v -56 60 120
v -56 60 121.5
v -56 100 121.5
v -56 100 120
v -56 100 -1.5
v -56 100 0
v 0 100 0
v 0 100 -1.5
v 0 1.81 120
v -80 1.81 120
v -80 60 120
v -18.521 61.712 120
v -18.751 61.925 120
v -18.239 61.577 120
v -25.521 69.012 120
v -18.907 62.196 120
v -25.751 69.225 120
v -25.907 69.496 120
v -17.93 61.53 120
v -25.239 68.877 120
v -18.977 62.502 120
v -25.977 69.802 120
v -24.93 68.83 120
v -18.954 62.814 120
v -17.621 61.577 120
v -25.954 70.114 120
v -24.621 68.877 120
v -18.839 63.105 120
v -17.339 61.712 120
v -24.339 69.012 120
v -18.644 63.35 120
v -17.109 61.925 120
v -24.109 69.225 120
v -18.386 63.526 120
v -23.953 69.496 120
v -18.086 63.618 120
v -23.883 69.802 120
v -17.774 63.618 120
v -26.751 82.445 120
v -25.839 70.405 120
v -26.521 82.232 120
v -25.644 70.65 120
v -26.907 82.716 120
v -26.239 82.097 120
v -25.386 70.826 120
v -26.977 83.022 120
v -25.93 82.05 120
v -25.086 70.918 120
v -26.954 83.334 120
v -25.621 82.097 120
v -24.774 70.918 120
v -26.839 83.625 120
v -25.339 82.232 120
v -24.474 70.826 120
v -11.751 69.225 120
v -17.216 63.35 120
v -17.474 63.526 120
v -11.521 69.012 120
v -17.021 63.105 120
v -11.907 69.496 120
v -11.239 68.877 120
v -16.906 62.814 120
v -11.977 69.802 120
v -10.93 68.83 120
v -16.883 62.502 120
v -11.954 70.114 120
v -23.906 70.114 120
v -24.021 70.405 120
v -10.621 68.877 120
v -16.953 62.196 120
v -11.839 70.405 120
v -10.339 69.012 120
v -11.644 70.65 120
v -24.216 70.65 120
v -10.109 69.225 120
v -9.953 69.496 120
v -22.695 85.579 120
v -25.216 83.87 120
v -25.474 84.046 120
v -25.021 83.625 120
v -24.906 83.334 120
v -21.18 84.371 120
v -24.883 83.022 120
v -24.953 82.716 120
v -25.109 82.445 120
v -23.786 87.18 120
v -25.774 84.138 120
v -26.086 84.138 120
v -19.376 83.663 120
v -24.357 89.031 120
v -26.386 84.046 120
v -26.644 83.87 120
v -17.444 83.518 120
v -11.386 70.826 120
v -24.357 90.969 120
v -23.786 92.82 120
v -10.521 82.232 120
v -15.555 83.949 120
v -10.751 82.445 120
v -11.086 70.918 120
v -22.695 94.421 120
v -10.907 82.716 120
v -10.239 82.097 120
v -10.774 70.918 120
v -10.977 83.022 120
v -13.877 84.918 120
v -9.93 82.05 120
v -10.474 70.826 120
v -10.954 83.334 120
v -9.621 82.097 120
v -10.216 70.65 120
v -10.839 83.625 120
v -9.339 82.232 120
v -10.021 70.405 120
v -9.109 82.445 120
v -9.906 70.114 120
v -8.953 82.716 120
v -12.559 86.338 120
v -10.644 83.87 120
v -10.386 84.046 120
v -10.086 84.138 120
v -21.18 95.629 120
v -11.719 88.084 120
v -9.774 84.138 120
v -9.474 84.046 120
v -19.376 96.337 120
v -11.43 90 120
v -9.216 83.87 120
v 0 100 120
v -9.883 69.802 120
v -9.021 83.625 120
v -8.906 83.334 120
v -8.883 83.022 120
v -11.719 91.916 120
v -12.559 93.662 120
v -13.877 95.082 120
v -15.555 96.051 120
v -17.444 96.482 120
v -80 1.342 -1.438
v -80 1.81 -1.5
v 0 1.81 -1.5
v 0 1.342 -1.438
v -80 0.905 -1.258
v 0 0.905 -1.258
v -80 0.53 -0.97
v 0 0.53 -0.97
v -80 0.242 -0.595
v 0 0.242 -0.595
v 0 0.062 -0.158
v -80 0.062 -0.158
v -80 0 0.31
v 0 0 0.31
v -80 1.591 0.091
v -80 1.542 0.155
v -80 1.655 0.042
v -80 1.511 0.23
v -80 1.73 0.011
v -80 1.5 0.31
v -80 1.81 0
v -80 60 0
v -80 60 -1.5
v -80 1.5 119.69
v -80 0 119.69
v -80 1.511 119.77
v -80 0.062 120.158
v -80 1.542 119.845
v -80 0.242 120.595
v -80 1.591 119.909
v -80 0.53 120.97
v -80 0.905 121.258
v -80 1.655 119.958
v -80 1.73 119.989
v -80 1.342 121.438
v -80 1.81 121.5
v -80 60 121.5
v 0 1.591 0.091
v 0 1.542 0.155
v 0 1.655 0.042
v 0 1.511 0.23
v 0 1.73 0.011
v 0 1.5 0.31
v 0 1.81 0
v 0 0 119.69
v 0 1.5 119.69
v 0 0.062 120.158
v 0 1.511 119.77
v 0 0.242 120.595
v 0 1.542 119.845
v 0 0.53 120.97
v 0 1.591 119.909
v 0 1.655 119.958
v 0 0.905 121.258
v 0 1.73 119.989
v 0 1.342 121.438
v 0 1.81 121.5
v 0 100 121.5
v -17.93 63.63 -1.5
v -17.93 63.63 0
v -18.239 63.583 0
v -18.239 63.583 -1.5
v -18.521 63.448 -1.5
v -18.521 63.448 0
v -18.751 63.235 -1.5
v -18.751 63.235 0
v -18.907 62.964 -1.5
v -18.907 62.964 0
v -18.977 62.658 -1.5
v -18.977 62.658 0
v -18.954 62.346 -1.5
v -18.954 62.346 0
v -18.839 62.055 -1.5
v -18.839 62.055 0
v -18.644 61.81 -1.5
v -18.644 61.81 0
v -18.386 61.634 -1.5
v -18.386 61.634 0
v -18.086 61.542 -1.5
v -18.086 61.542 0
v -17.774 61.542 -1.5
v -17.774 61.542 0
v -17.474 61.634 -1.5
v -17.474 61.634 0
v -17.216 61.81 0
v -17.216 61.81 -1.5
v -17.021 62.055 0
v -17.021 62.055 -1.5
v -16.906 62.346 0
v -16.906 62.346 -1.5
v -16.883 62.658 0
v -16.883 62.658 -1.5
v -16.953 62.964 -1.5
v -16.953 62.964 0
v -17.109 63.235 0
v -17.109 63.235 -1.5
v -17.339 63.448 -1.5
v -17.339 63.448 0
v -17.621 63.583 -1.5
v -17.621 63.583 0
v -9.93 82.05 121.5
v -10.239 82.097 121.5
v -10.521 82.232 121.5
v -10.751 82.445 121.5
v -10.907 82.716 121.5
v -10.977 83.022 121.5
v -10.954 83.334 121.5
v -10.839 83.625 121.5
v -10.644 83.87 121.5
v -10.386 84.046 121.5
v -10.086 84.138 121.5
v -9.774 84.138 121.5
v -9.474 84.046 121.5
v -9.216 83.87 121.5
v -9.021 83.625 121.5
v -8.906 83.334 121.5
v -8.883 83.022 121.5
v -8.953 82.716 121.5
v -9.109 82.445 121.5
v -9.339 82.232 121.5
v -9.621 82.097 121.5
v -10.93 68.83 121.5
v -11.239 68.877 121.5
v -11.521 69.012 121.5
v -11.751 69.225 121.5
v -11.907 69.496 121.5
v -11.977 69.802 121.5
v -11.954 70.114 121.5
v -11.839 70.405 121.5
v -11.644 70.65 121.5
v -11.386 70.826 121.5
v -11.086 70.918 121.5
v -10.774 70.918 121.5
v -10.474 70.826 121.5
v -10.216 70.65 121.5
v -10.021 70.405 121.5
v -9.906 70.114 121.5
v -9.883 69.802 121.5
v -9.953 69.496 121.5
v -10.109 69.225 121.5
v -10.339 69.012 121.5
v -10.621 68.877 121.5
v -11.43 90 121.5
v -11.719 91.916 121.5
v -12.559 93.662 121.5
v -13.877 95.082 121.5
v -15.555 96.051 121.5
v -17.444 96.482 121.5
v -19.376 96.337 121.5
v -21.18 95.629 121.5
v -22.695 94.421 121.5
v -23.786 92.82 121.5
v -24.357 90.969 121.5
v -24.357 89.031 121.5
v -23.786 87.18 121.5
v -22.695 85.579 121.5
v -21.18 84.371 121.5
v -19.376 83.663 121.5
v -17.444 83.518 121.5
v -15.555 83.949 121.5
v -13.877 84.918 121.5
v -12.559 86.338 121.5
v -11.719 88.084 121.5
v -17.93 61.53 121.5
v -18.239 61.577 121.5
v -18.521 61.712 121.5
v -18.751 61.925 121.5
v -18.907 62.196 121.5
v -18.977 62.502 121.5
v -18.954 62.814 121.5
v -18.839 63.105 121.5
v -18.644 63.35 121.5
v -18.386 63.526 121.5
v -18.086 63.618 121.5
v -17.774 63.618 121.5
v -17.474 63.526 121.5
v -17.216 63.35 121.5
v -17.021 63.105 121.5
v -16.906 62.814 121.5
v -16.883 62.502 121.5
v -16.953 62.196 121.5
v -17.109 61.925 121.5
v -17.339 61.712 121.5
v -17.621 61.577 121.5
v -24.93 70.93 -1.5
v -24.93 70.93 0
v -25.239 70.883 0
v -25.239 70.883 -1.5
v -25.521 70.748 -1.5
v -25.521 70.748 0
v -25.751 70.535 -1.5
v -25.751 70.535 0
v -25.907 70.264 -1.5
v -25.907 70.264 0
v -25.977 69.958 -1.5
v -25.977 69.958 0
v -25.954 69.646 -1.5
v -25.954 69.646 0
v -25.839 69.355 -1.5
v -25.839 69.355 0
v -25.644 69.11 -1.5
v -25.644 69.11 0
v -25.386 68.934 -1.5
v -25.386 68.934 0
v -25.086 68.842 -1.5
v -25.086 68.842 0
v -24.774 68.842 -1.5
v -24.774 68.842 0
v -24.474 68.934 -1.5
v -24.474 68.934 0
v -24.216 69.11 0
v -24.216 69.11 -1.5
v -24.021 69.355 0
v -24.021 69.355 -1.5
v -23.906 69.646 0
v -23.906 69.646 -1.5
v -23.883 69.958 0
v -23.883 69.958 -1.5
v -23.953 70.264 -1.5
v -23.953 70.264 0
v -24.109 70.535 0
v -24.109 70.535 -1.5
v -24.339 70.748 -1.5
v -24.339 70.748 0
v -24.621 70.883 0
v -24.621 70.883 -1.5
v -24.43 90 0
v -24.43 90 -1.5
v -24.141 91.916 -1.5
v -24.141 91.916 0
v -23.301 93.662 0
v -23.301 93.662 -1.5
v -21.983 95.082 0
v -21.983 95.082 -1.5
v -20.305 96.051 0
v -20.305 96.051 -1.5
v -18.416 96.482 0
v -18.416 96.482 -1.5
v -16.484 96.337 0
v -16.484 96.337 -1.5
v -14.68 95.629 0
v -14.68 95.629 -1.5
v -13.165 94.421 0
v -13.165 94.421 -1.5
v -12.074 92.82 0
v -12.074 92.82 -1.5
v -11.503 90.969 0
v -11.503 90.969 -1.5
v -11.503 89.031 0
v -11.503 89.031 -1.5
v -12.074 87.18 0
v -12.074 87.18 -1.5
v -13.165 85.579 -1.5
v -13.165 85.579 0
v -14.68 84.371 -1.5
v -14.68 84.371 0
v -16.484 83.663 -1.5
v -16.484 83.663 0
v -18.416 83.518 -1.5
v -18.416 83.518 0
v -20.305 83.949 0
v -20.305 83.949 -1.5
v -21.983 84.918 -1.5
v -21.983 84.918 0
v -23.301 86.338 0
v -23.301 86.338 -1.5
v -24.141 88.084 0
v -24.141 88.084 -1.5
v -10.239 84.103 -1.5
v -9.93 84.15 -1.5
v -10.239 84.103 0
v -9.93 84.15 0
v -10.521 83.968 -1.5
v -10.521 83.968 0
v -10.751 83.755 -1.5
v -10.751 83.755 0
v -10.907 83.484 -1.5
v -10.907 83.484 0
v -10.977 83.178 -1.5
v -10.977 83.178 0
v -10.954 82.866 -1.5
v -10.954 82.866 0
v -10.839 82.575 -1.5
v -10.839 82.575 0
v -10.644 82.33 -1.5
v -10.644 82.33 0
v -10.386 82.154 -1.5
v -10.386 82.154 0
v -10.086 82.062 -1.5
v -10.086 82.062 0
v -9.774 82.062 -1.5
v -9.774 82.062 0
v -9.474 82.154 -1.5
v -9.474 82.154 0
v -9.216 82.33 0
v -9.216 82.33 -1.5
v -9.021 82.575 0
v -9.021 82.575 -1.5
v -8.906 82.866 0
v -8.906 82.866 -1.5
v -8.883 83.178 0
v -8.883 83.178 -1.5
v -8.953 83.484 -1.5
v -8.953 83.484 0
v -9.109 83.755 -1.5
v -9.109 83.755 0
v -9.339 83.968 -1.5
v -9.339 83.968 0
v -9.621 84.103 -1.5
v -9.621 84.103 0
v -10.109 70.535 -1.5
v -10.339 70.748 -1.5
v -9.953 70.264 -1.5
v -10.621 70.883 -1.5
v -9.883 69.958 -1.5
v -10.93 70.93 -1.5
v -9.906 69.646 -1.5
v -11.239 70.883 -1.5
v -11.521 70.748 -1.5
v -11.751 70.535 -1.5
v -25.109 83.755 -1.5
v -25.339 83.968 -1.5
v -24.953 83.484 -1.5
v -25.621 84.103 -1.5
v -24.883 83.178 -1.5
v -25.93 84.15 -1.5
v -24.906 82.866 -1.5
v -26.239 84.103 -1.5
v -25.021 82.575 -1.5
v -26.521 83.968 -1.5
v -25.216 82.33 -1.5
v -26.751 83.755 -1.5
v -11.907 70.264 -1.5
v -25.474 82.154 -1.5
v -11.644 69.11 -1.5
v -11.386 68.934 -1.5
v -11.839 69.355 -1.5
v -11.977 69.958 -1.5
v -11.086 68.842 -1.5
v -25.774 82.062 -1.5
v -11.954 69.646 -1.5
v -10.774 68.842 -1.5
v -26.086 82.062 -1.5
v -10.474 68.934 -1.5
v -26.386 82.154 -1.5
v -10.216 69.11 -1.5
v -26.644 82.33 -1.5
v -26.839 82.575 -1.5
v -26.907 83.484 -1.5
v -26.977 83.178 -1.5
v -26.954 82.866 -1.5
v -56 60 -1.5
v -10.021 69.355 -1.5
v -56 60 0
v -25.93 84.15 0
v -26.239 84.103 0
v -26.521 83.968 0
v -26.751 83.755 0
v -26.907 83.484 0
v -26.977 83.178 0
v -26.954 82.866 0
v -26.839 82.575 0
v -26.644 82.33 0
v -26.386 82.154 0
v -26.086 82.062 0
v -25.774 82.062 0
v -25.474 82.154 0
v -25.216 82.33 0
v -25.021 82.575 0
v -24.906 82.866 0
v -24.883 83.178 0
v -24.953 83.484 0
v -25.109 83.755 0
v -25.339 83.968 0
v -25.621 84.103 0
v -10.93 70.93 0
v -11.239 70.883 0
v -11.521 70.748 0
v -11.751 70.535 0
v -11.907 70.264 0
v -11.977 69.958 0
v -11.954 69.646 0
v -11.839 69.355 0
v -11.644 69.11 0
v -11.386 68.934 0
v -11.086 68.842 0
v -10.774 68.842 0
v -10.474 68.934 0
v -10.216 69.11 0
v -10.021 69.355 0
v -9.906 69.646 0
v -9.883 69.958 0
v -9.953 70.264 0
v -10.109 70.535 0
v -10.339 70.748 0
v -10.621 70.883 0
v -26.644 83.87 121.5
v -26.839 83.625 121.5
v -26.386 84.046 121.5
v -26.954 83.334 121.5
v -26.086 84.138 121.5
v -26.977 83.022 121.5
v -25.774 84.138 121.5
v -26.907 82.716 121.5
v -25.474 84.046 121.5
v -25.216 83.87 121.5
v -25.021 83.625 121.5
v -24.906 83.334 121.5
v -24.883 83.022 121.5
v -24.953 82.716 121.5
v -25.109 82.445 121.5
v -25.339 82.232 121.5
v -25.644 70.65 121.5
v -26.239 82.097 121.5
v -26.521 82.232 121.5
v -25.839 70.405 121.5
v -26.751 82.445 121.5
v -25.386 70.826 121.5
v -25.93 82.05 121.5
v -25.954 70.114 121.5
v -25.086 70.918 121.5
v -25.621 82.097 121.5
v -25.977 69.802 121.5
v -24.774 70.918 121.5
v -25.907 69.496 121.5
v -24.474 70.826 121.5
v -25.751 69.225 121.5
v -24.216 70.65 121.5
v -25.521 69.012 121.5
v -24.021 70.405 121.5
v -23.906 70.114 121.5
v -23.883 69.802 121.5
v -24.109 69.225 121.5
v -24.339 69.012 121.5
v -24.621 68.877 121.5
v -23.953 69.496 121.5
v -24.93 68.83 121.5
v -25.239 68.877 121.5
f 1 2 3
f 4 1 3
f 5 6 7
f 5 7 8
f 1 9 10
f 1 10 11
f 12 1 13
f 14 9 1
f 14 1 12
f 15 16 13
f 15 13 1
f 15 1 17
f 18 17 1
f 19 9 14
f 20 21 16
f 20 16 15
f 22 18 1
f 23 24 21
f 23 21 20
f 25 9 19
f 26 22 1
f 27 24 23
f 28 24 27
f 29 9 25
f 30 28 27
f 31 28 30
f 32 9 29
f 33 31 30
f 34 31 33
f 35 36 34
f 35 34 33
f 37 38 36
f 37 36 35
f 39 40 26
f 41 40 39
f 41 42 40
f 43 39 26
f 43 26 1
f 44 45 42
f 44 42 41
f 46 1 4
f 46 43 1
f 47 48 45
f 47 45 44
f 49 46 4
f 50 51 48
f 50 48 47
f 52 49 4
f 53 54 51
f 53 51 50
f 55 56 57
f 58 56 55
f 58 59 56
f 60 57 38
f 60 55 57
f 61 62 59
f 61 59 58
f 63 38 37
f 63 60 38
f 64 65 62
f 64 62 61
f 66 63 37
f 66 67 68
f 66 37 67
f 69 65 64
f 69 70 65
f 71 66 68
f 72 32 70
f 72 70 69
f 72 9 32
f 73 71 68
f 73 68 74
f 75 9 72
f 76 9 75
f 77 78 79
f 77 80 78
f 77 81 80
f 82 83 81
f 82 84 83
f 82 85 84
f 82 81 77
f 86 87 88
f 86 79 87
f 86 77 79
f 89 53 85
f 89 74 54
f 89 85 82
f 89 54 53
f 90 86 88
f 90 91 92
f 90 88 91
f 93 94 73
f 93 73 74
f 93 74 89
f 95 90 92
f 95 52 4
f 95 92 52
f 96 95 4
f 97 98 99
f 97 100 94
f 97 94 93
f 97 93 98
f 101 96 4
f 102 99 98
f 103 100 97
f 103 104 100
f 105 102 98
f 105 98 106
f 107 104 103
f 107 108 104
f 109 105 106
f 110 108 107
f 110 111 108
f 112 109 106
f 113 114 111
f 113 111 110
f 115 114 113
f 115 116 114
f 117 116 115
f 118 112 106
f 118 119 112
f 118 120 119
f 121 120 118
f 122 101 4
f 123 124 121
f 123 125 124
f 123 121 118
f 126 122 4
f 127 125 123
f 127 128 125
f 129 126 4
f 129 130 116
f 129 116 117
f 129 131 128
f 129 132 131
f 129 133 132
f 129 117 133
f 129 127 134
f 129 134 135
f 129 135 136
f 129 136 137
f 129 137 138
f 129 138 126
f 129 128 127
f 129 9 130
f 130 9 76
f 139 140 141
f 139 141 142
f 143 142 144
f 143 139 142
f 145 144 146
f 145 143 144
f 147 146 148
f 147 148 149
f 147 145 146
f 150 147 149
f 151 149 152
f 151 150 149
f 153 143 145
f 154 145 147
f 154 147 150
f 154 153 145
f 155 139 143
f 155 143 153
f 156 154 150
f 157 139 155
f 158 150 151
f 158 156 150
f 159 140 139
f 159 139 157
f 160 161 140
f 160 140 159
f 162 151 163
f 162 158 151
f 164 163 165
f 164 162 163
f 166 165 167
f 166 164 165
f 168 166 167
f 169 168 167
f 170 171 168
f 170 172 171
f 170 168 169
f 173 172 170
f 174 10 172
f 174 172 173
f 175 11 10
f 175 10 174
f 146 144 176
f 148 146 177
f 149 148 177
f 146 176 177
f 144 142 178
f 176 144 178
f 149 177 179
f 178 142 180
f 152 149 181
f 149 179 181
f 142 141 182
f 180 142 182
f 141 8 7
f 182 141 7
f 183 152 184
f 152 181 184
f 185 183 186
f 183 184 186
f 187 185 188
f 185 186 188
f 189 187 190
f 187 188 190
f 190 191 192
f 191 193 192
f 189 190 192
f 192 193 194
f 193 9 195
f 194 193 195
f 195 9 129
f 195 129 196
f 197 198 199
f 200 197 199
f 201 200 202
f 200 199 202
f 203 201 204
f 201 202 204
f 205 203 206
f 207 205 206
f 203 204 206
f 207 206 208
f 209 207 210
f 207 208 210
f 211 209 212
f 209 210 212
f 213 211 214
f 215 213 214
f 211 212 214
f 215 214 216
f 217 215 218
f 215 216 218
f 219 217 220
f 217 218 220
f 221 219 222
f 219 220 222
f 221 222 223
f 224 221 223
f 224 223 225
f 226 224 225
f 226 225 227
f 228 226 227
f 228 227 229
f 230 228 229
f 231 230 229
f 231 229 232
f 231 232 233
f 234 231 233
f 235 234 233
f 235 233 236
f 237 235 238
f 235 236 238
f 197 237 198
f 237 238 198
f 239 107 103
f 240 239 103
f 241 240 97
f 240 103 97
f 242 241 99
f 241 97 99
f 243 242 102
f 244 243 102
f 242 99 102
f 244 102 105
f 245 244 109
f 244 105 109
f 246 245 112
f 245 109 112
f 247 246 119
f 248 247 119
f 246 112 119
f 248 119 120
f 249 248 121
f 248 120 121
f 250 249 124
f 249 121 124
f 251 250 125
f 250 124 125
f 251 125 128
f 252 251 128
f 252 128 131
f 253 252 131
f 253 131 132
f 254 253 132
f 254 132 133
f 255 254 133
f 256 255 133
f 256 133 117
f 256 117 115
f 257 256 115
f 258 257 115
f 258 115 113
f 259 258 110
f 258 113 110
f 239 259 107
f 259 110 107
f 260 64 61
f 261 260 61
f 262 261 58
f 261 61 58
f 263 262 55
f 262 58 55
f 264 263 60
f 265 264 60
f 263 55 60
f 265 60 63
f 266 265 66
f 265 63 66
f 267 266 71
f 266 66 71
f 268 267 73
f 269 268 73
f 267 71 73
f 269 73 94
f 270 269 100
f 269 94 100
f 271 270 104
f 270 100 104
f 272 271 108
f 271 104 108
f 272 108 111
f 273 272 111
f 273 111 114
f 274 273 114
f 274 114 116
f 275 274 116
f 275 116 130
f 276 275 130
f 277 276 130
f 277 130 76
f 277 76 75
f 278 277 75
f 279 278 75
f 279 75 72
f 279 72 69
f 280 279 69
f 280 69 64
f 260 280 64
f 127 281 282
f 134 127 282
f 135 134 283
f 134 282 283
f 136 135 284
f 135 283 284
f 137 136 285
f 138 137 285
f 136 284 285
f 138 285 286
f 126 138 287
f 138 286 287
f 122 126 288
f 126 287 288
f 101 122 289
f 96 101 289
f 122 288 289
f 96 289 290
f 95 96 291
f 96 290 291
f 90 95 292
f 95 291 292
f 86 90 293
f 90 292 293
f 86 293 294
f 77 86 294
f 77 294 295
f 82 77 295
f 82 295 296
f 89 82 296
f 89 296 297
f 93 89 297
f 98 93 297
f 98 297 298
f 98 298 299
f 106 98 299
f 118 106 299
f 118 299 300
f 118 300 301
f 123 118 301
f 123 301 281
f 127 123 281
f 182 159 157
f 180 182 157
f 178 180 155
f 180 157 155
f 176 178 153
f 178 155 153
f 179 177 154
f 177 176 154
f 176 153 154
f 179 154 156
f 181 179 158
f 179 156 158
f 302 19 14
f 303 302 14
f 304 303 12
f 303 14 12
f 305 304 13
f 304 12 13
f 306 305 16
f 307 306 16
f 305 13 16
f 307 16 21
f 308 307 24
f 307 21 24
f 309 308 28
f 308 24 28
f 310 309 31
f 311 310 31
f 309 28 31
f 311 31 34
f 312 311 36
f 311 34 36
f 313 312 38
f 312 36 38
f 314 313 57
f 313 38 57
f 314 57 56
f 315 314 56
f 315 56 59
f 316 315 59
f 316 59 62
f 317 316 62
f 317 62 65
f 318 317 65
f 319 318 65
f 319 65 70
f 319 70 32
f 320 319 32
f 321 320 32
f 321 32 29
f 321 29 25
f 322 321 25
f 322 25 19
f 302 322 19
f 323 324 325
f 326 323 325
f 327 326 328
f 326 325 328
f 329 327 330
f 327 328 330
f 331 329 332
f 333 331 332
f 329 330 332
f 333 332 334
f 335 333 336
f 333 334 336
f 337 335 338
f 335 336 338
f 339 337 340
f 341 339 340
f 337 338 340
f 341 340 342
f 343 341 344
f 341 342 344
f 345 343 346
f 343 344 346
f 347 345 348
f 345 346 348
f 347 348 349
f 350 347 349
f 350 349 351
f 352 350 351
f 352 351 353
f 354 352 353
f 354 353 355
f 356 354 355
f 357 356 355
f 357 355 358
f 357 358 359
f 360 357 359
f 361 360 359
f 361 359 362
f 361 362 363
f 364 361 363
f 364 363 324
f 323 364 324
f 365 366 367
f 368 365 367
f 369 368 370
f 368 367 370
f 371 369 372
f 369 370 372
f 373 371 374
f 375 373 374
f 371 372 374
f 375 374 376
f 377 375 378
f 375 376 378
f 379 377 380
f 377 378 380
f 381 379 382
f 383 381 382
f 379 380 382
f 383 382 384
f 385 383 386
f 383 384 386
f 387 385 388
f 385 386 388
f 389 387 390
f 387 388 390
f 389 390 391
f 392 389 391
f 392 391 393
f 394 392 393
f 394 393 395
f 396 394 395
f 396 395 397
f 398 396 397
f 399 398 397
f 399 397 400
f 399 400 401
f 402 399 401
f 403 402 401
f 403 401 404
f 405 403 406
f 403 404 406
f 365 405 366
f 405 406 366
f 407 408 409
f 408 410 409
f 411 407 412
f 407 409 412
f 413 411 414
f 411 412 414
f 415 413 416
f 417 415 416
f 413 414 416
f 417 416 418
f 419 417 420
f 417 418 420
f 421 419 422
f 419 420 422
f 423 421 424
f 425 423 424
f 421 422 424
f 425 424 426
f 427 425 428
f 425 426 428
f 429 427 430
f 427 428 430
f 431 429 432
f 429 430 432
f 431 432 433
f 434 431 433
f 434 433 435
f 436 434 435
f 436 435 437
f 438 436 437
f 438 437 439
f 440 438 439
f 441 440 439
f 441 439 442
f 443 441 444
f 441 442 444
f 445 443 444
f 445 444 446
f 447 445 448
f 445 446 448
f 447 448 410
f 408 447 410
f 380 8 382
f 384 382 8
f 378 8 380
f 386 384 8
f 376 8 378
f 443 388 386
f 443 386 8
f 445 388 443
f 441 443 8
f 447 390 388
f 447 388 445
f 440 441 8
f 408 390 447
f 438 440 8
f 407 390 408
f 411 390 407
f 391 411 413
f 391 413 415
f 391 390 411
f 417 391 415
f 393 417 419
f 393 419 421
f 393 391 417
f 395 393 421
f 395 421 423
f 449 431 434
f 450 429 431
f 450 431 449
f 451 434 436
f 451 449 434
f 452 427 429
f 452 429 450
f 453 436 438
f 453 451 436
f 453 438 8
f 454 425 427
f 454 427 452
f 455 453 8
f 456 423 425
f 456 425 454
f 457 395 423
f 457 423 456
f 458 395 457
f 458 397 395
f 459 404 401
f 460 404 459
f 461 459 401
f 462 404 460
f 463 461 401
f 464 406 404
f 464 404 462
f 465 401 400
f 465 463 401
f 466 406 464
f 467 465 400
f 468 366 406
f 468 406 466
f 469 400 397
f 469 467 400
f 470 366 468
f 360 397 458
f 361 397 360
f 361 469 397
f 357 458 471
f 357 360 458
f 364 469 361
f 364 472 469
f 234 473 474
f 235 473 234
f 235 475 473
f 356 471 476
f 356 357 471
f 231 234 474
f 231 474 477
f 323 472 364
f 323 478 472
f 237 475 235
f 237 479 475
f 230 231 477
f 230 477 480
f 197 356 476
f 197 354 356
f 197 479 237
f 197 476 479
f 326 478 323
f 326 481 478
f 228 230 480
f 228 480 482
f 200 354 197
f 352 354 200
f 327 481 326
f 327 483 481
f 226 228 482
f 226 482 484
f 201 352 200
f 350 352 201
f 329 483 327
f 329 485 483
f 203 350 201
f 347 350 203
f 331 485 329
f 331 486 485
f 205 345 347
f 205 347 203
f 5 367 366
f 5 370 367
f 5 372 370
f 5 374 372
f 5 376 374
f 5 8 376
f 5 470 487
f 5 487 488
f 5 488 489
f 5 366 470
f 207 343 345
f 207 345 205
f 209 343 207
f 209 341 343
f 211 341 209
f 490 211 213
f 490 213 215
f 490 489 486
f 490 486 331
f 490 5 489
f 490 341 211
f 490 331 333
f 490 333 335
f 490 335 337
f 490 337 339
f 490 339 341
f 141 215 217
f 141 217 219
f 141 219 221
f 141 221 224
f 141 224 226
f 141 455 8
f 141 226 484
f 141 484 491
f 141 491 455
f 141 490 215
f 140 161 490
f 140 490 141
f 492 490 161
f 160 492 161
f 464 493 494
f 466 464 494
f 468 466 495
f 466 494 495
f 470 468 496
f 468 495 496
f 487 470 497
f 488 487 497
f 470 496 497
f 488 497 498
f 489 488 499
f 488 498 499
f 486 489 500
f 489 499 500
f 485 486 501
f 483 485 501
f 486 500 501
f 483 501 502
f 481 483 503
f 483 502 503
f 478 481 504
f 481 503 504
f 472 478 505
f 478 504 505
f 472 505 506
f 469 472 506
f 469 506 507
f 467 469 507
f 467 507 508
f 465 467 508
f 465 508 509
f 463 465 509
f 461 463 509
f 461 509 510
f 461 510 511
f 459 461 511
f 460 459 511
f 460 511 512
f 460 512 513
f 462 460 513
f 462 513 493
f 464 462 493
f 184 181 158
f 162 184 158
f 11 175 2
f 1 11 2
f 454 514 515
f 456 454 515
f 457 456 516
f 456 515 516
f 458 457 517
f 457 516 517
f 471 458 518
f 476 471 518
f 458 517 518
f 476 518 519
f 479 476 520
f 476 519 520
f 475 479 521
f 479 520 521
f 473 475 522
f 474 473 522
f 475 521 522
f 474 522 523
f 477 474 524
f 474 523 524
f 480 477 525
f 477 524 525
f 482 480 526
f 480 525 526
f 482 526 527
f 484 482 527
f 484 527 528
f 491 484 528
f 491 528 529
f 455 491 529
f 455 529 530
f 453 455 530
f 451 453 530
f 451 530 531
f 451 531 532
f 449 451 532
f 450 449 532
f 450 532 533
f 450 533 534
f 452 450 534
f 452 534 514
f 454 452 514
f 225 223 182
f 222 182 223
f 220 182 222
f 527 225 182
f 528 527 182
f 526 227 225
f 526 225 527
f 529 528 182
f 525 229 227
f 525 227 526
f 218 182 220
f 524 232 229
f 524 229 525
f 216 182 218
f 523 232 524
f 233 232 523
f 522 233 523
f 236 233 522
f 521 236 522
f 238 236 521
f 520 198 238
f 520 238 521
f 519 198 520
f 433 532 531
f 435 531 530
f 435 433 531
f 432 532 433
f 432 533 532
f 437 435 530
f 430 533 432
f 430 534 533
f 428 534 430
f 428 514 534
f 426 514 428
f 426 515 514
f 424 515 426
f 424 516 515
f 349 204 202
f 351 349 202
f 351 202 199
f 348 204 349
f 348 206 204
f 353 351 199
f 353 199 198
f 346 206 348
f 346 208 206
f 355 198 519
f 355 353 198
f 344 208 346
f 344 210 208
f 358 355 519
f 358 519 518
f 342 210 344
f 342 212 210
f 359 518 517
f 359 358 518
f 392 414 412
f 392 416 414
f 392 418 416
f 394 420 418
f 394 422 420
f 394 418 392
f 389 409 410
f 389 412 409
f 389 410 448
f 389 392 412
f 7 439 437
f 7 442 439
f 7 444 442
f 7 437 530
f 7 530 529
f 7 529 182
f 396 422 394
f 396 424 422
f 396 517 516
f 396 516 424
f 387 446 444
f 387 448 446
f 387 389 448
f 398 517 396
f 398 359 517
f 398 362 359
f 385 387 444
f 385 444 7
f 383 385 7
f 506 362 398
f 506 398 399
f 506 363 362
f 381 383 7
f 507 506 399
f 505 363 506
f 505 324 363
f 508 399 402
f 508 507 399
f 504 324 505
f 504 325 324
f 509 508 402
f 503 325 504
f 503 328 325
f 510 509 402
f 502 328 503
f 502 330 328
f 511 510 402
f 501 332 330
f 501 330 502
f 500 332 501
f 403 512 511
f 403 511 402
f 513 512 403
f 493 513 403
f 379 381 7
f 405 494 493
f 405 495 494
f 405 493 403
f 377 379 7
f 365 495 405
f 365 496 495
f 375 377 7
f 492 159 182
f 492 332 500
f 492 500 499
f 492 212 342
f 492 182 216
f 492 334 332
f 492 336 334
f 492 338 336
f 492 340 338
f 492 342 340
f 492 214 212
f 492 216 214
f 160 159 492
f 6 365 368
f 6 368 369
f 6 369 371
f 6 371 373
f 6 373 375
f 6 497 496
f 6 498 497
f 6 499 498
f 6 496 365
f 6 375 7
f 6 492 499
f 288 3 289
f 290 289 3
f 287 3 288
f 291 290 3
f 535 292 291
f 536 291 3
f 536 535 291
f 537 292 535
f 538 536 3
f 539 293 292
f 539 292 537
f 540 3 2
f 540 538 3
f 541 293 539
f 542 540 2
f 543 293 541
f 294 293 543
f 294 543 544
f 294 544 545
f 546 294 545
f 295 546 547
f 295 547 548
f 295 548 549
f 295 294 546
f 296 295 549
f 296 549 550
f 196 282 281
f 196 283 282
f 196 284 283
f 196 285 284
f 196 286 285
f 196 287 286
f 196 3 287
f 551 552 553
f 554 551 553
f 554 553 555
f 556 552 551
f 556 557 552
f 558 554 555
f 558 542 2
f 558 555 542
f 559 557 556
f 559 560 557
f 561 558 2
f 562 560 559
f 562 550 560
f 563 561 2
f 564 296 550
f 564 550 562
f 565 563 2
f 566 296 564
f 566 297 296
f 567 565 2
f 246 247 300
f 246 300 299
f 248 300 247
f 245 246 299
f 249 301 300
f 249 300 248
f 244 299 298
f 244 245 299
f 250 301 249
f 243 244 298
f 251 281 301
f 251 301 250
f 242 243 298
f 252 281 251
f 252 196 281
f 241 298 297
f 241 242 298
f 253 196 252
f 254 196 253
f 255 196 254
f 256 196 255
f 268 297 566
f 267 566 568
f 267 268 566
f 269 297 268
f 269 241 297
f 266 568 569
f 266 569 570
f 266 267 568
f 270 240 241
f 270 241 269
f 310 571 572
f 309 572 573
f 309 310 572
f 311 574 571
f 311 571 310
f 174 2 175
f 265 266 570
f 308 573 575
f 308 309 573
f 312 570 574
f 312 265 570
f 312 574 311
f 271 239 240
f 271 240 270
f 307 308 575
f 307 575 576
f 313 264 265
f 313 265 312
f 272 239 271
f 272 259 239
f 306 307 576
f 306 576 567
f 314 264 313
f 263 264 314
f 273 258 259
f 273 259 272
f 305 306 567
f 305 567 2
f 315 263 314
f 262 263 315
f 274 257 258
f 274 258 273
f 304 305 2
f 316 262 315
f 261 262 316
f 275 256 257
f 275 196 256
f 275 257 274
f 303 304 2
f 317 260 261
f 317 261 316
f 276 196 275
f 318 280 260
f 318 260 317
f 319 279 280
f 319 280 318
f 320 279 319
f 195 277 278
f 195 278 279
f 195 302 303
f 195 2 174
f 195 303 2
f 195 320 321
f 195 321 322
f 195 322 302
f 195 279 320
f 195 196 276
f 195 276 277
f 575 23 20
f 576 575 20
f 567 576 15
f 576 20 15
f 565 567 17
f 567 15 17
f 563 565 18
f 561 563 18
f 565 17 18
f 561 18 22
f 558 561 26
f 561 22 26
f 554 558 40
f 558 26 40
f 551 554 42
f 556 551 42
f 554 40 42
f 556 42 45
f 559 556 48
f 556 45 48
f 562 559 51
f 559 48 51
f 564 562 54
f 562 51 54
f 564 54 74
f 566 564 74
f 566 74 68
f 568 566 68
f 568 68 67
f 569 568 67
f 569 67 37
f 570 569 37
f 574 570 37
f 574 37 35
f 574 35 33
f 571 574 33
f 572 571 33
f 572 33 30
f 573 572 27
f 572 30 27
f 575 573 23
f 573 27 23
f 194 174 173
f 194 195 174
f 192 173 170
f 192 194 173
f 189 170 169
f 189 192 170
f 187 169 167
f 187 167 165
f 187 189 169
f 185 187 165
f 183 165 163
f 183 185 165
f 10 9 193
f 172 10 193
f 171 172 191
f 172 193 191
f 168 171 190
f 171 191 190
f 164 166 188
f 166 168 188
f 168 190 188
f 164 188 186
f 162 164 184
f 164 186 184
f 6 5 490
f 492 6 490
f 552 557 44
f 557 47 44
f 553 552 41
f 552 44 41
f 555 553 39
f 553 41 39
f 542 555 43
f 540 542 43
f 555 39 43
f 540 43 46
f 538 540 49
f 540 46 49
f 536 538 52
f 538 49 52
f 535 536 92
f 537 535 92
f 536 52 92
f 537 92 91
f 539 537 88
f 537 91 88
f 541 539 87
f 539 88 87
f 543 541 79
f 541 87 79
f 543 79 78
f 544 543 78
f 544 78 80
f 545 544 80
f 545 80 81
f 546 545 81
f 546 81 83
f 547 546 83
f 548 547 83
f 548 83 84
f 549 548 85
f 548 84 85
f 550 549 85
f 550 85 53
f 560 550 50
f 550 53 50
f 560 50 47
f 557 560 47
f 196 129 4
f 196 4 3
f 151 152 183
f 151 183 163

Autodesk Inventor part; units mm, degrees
ref_plane "YZ Plane" through (0, 0, 0) normal (1, 0, 0) x (0, 1, 0)
ref_plane "XZ Plane" through (0, 0, 0) normal (0, 1, 0) x (-1, 0, 0)
ref_plane "XY Plane" through (0, 0, 0) normal (0, 0, 1) x (1, 0, 0)
sketch "Sketch1" plane through (0, 0, 0) normal (0, 1, 0) x (-1, 0, 0)
  line L0 (0, 0) -> (80, 0)
  line L1 (80, 0) -> (80, 120)
  line L2 (80, 120) -> (0, 120)
  line L3 (0, 120) -> (0, 0)
  dimension "d0" = 80
  dimension "d1" = 120
extrude "Plate1" add sketch "Sketch1" along normal blind 1.5
sketch "Sketch2" plane through (0, 0, 121.5) normal (0, 0, -1) x (-1, 0, 0)
  line L0 (80, 0) -> (0, 0)
  line L1 (0, 0) -> (0, 100)
  line L2 (0, 100) -> (80, 100)
  line L3 (80, 100) -> (80, 0)
edge flange "Flange1" height 100 angle 90 thickness 1.5 bend radius 0.31 thickness toward (0, 0, -1) relief tear relief width 1.5 relief depth 0.75 edges at (-40, 1.5, 120) wall of the first edge with corners at (-80, 0, 121.5) (0, 0, 121.5) (0, 100, 121.5) (-80, 100, 121.5)
bend "Bend1"
corner "Corner1"
sketch "Sketch3" plane through (-80, 0, -1.5) normal (0, 0, 1) x (1, 0, 0)
  line L0 (80, 0) -> (0, 0)
  line L1 (0, 0) -> (0, 100)
  line L2 (0, 100) -> (80, 100)
  line L3 (80, 100) -> (80, 0)
edge flange "Flange2" height 100 angle 90 thickness 1.5 bend radius 0.31 thickness toward (0, 0, 1) relief tear relief width 1.5 relief depth 0.75 edges at (-40, 1.5, 0) wall of the first edge with corners at (0, 0, -1.5) (-80, 0, -1.5) (-80, 100, -1.5) (0, 100, -1.5)
bend "Bend2"
corner "Corner2"
sketch "Sketch4" plane through (0, 100, -1.5) normal (0, 0, -1) x (-1, 0, 0)
  line L0 (56, -40) -> (80, -40)
  line L1 (80, -40) -> (80, 0)
  line L2 (80, 0) -> (56, 0)
  line L3 (56, 0) -> (56, -40)
  line L4 (80, 0) -> (80, -98.19) projected
  line L5 (0, 0) -> (80, 0) projected
  point P0 (0, -100)
  dimension "d23" = 24
  dimension "d24" = 40
extrude "Cut1" cut sketch "Sketch4" against normal blind 1.5
sketch "Sketch5" plane through (0, 100, 120) normal (0, 0, -1) x (-1, 0, 0)
  point P0 (0, -100)
sketch "Sketch6" plane through (-80, 100, 121.5) normal (0, 0, 1) x (1, 0, 0)
  line L0 (24, 0) -> (0, 0)
  line L1 (0, 0) -> (0, -40)
  line L2 (0, -40) -> (24, -40)
  line L3 (24, -40) -> (24, 0)
  line L4 (0, -98.19) -> (0, 0) projected
  line L5 (0, 0) -> (80, 0) projected
  point P0 (80, -100)
  dimension "d27" = 40
  dimension "d28" = 24
extrude "Cut2" cut sketch "Sketch6" against normal blind 1.5
sketch "Sketch7" plane through (0, 1.81, -1.5) normal (0, 0, -1) x (-1, 0, 0)
  circle A0 centre (17.93, 60.77) radius 0.7835 projected
  circle A1 centre (10.93, 68.07) radius 0.7835 projected
  circle A2 centre (24.93, 68.07) radius 0.7835 projected
  circle A3 centre (9.93, 81.29) radius 0.7835 projected
  circle A4 centre (25.93, 81.29) radius 0.7835 projected
  line L0 (24, 59.37) -> (11.86, 59.37) projected
  line L1 (24, 59.37) -> (24, 60.09) projected
  arc A5 (26, 62.09) -> (24, 60.09) centre (26, 60.09) ccw projected
  line L2 (26, 62.09) -> (26.72, 62.09) projected
  line L3 (26.72, 94.19) -> (26.72, 62.09) projected
  line L4 (26.72, 94.19) -> (26, 94.19) projected
  arc A6 (24, 96.19) -> (26, 94.19) centre (26, 96.19) ccw projected
  line L5 (24, 96.19) -> (24, 96.91) projected
  line L6 (11.86, 96.91) -> (24, 96.91) projected
  line L7 (11.86, 96.91) -> (11.86, 96.19) projected
  arc A7 (9.86, 94.19) -> (11.86, 96.19) centre (9.86, 96.19) ccw projected
  line L8 (9.86, 94.19) -> (9.14, 94.19) projected
  line L9 (9.14, 62.09) -> (9.14, 94.19) projected
  line L10 (9.14, 62.09) -> (9.86, 62.09) projected
  arc A8 (11.86, 60.09) -> (9.86, 62.09) centre (9.86, 60.09) ccw projected
  line L11 (11.86, 60.09) -> (11.86, 59.37) projected
  circle A9 centre (17.93, 88.19) radius 6.4 projected
  point P0 (0, -1.81)
  point P1 (11.86, 94.19)
hole "Hole1" at (-10.93, 69.88, -1.5) at (-9.93, 83.1, -1.5) at (-25.93, 83.1, -1.5) at (-24.93, 69.88, -1.5) at (-17.93, 62.58, -1.5) direction (0, 0, 1) diameter 2.1 depth 1.5
sketch "Sketch8" plane through (-80, 1.81, 121.5) normal (0, 0, 1) x (1, 0, 0)
  circle A0 centre (62.07, 60.77) radius 0.7835 projected
  circle A1 centre (55.07, 68.07) radius 0.7835 projected
  circle A2 centre (69.07, 68.07) radius 0.7835 projected
  circle A3 centre (54.07, 81.29) radius 0.7835 projected
  circle A4 centre (70.07, 81.29) radius 0.7835 projected
  line L0 (68.14, 59.37) -> (56, 59.37) projected
  line L1 (68.14, 59.37) -> (68.14, 60.09) projected
  arc A5 (70.14, 62.09) -> (68.14, 60.09) centre (70.14, 60.09) ccw projected
  line L2 (70.14, 62.09) -> (70.86, 62.09) projected
  line L3 (70.86, 94.19) -> (70.86, 62.09) projected
  line L4 (70.86, 94.19) -> (70.14, 94.19) projected
  arc A6 (68.14, 96.19) -> (70.14, 94.19) centre (70.14, 96.19) ccw projected
  line L5 (68.14, 96.19) -> (68.14, 96.91) projected
  line L6 (56, 96.91) -> (68.14, 96.91) projected
  line L7 (56, 96.91) -> (56, 96.19) projected
  arc A7 (54, 94.19) -> (56, 96.19) centre (54, 96.19) ccw projected
  line L8 (54, 94.19) -> (53.28, 94.19) projected
  line L9 (53.28, 62.09) -> (53.28, 94.19) projected
  line L10 (53.28, 62.09) -> (54, 62.09) projected
  arc A8 (56, 60.09) -> (54, 62.09) centre (54, 60.09) ccw projected
  line L11 (56, 60.09) -> (56, 59.37) projected
  circle A9 centre (62.07, 88.19) radius 6.4 projected
  point P0 (80, -1.81)
  point P1 (56, 94.19)
hole "Hole2" at (-25.93, 83.1, 121.5) at (-9.93, 83.1, 121.5) at (-10.93, 69.88, 121.5) at (-24.93, 69.88, 121.5) at (-17.93, 62.58, 121.5) direction (0, 0, -1) diameter 2.1 depth 1.5
sketch "Sketch9" plane through (-80, 1.81, 121.5) normal (0, 0, 1) x (1, 0, 0)
  circle A0 centre (62.07, 60.77) radius 0.7835 projected
  circle A1 centre (55.07, 68.07) radius 0.7835 projected
  circle A2 centre (69.07, 68.07) radius 0.7835 projected
  circle A3 centre (54.07, 81.29) radius 0.7835 projected
  circle A4 centre (70.07, 81.29) radius 0.7835 projected
  line L0 (68.14, 59.37) -> (56, 59.37) projected
  line L1 (68.14, 59.37) -> (68.14, 60.09) projected
  arc A5 (70.14, 62.09) -> (68.14, 60.09) centre (70.14, 60.09) ccw projected
  line L2 (70.14, 62.09) -> (70.86, 62.09) projected
  line L3 (70.86, 94.19) -> (70.86, 62.09) projected
  line L4 (70.86, 94.19) -> (70.14, 94.19) projected
  arc A6 (68.14, 96.19) -> (70.14, 94.19) centre (70.14, 96.19) ccw projected
  line L5 (68.14, 96.19) -> (68.14, 96.91) projected
  line L6 (56, 96.91) -> (68.14, 96.91) projected
  line L7 (56, 96.91) -> (56, 96.19) projected
  arc A7 (54, 94.19) -> (56, 96.19) centre (54, 96.19) ccw projected
  line L8 (54, 94.19) -> (53.28, 94.19) projected
  line L9 (53.28, 62.09) -> (53.28, 94.19) projected
  line L10 (53.28, 62.09) -> (54, 62.09) projected
  arc A8 (56, 60.09) -> (54, 62.09) centre (54, 60.09) ccw projected
  line L11 (56, 60.09) -> (56, 59.37) projected
  circle A9 centre (62.07, 88.19) radius 6.4 projected
  circle A10 centre (62.07, 88.19) radius 6.5
  point P0 (80, -1.81)
  point P1 (56, 94.19)
  dimension "d45" = 13
extrude "Extrusion1" cut sketch "Sketch9" against normal blind 1.5 contours A9 | A10
sketch "Sketch10" plane through (0, 1.81, -1.5) normal (0, 0, -1) x (-1, 0, 0)
  circle A0 centre (17.93, 60.77) radius 0.7835 projected
  circle A1 centre (10.93, 68.07) radius 0.7835 projected
  circle A2 centre (24.93, 68.07) radius 0.7835 projected
  circle A3 centre (9.93, 81.29) radius 0.7835 projected
  circle A4 centre (25.93, 81.29) radius 0.7835 projected
  line L0 (24, 59.37) -> (11.86, 59.37) projected
  line L1 (24, 59.37) -> (24, 60.09) projected
  arc A5 (26, 62.09) -> (24, 60.09) centre (26, 60.09) ccw projected
  line L2 (26, 62.09) -> (26.72, 62.09) projected
  line L3 (26.72, 94.19) -> (26.72, 62.09) projected
  line L4 (26.72, 94.19) -> (26, 94.19) projected
  arc A6 (24, 96.19) -> (26, 94.19) centre (26, 96.19) ccw projected
  line L5 (24, 96.19) -> (24, 96.91) projected
  line L6 (11.86, 96.91) -> (24, 96.91) projected
  line L7 (11.86, 96.91) -> (11.86, 96.19) projected
  arc A7 (9.86, 94.19) -> (11.86, 96.19) centre (9.86, 96.19) ccw projected
  line L8 (9.86, 94.19) -> (9.14, 94.19) projected
  line L9 (9.14, 62.09) -> (9.14, 94.19) projected
  line L10 (9.14, 62.09) -> (9.86, 62.09) projected
  arc A8 (11.86, 60.09) -> (9.86, 62.09) centre (9.86, 60.09) ccw projected
  line L11 (11.86, 60.09) -> (11.86, 59.37) projected
  circle A9 centre (17.93, 88.19) radius 6.4 projected
  circle A10 centre (17.93, 88.19) radius 6.5
  point P0 (0, -1.81)
  point P1 (11.86, 94.19)
  dimension "d48" = 13
extrude "Extrusion2" cut sketch "Sketch10" against normal blind 1.5 contours A9 | A10
equation "\"d25\" = Thickness"
equation "\"d29\" = Thickness"
equation "\"d36\" = Thickness"
equation "\"d43\" = Thickness"
equation "\"d2\" = Thickness"
equation "\"d3\" = BendReliefWidth"
equation "\"d4\" = BendReliefDepth"
equation "\"d5\" = MinimumRemnant"
equation "\"d6\" = TransitionRadius"
equation "\"d9\" = BendRadius"
equation "\"d10\" = CornerReliefSize"
equation "\"d11\" = GapSize"
equation "\"d12\" = JacobiRadiusSize"
equation "\"d13\" = BendReliefWidth"
equation "\"d14\" = BendReliefDepth"
equation "\"d15\" = MinimumRemnant"
equation "\"d16\" = TransitionRadius"
equation "\"d19\" = BendRadius"
equation "\"d20\" = CornerReliefSize"
equation "\"d21\" = GapSize"
equation "\"d22\" = JacobiRadiusSize"
equation "\"BendReliefWidth\" = Thickness"
equation "\"BendReliefDepth\" = 0.5 * Thickness"
equation "\"CornerReliefSize\" = 4 * Thickness"
equation "\"MinimumRemnant\" = 2 * Thickness"
equation "\"TransitionRadius\" = BendRadius"
equation "\"JacobiRadiusSize\" = BendRadius"
equation "\"GapSize\" = Thickness"
equation "\"Thickness\" = 1.5"
equation "\"BendRadius\" = 0.31"
properties part number "body_main_frame" material "Aluminum 6061-AHC"
